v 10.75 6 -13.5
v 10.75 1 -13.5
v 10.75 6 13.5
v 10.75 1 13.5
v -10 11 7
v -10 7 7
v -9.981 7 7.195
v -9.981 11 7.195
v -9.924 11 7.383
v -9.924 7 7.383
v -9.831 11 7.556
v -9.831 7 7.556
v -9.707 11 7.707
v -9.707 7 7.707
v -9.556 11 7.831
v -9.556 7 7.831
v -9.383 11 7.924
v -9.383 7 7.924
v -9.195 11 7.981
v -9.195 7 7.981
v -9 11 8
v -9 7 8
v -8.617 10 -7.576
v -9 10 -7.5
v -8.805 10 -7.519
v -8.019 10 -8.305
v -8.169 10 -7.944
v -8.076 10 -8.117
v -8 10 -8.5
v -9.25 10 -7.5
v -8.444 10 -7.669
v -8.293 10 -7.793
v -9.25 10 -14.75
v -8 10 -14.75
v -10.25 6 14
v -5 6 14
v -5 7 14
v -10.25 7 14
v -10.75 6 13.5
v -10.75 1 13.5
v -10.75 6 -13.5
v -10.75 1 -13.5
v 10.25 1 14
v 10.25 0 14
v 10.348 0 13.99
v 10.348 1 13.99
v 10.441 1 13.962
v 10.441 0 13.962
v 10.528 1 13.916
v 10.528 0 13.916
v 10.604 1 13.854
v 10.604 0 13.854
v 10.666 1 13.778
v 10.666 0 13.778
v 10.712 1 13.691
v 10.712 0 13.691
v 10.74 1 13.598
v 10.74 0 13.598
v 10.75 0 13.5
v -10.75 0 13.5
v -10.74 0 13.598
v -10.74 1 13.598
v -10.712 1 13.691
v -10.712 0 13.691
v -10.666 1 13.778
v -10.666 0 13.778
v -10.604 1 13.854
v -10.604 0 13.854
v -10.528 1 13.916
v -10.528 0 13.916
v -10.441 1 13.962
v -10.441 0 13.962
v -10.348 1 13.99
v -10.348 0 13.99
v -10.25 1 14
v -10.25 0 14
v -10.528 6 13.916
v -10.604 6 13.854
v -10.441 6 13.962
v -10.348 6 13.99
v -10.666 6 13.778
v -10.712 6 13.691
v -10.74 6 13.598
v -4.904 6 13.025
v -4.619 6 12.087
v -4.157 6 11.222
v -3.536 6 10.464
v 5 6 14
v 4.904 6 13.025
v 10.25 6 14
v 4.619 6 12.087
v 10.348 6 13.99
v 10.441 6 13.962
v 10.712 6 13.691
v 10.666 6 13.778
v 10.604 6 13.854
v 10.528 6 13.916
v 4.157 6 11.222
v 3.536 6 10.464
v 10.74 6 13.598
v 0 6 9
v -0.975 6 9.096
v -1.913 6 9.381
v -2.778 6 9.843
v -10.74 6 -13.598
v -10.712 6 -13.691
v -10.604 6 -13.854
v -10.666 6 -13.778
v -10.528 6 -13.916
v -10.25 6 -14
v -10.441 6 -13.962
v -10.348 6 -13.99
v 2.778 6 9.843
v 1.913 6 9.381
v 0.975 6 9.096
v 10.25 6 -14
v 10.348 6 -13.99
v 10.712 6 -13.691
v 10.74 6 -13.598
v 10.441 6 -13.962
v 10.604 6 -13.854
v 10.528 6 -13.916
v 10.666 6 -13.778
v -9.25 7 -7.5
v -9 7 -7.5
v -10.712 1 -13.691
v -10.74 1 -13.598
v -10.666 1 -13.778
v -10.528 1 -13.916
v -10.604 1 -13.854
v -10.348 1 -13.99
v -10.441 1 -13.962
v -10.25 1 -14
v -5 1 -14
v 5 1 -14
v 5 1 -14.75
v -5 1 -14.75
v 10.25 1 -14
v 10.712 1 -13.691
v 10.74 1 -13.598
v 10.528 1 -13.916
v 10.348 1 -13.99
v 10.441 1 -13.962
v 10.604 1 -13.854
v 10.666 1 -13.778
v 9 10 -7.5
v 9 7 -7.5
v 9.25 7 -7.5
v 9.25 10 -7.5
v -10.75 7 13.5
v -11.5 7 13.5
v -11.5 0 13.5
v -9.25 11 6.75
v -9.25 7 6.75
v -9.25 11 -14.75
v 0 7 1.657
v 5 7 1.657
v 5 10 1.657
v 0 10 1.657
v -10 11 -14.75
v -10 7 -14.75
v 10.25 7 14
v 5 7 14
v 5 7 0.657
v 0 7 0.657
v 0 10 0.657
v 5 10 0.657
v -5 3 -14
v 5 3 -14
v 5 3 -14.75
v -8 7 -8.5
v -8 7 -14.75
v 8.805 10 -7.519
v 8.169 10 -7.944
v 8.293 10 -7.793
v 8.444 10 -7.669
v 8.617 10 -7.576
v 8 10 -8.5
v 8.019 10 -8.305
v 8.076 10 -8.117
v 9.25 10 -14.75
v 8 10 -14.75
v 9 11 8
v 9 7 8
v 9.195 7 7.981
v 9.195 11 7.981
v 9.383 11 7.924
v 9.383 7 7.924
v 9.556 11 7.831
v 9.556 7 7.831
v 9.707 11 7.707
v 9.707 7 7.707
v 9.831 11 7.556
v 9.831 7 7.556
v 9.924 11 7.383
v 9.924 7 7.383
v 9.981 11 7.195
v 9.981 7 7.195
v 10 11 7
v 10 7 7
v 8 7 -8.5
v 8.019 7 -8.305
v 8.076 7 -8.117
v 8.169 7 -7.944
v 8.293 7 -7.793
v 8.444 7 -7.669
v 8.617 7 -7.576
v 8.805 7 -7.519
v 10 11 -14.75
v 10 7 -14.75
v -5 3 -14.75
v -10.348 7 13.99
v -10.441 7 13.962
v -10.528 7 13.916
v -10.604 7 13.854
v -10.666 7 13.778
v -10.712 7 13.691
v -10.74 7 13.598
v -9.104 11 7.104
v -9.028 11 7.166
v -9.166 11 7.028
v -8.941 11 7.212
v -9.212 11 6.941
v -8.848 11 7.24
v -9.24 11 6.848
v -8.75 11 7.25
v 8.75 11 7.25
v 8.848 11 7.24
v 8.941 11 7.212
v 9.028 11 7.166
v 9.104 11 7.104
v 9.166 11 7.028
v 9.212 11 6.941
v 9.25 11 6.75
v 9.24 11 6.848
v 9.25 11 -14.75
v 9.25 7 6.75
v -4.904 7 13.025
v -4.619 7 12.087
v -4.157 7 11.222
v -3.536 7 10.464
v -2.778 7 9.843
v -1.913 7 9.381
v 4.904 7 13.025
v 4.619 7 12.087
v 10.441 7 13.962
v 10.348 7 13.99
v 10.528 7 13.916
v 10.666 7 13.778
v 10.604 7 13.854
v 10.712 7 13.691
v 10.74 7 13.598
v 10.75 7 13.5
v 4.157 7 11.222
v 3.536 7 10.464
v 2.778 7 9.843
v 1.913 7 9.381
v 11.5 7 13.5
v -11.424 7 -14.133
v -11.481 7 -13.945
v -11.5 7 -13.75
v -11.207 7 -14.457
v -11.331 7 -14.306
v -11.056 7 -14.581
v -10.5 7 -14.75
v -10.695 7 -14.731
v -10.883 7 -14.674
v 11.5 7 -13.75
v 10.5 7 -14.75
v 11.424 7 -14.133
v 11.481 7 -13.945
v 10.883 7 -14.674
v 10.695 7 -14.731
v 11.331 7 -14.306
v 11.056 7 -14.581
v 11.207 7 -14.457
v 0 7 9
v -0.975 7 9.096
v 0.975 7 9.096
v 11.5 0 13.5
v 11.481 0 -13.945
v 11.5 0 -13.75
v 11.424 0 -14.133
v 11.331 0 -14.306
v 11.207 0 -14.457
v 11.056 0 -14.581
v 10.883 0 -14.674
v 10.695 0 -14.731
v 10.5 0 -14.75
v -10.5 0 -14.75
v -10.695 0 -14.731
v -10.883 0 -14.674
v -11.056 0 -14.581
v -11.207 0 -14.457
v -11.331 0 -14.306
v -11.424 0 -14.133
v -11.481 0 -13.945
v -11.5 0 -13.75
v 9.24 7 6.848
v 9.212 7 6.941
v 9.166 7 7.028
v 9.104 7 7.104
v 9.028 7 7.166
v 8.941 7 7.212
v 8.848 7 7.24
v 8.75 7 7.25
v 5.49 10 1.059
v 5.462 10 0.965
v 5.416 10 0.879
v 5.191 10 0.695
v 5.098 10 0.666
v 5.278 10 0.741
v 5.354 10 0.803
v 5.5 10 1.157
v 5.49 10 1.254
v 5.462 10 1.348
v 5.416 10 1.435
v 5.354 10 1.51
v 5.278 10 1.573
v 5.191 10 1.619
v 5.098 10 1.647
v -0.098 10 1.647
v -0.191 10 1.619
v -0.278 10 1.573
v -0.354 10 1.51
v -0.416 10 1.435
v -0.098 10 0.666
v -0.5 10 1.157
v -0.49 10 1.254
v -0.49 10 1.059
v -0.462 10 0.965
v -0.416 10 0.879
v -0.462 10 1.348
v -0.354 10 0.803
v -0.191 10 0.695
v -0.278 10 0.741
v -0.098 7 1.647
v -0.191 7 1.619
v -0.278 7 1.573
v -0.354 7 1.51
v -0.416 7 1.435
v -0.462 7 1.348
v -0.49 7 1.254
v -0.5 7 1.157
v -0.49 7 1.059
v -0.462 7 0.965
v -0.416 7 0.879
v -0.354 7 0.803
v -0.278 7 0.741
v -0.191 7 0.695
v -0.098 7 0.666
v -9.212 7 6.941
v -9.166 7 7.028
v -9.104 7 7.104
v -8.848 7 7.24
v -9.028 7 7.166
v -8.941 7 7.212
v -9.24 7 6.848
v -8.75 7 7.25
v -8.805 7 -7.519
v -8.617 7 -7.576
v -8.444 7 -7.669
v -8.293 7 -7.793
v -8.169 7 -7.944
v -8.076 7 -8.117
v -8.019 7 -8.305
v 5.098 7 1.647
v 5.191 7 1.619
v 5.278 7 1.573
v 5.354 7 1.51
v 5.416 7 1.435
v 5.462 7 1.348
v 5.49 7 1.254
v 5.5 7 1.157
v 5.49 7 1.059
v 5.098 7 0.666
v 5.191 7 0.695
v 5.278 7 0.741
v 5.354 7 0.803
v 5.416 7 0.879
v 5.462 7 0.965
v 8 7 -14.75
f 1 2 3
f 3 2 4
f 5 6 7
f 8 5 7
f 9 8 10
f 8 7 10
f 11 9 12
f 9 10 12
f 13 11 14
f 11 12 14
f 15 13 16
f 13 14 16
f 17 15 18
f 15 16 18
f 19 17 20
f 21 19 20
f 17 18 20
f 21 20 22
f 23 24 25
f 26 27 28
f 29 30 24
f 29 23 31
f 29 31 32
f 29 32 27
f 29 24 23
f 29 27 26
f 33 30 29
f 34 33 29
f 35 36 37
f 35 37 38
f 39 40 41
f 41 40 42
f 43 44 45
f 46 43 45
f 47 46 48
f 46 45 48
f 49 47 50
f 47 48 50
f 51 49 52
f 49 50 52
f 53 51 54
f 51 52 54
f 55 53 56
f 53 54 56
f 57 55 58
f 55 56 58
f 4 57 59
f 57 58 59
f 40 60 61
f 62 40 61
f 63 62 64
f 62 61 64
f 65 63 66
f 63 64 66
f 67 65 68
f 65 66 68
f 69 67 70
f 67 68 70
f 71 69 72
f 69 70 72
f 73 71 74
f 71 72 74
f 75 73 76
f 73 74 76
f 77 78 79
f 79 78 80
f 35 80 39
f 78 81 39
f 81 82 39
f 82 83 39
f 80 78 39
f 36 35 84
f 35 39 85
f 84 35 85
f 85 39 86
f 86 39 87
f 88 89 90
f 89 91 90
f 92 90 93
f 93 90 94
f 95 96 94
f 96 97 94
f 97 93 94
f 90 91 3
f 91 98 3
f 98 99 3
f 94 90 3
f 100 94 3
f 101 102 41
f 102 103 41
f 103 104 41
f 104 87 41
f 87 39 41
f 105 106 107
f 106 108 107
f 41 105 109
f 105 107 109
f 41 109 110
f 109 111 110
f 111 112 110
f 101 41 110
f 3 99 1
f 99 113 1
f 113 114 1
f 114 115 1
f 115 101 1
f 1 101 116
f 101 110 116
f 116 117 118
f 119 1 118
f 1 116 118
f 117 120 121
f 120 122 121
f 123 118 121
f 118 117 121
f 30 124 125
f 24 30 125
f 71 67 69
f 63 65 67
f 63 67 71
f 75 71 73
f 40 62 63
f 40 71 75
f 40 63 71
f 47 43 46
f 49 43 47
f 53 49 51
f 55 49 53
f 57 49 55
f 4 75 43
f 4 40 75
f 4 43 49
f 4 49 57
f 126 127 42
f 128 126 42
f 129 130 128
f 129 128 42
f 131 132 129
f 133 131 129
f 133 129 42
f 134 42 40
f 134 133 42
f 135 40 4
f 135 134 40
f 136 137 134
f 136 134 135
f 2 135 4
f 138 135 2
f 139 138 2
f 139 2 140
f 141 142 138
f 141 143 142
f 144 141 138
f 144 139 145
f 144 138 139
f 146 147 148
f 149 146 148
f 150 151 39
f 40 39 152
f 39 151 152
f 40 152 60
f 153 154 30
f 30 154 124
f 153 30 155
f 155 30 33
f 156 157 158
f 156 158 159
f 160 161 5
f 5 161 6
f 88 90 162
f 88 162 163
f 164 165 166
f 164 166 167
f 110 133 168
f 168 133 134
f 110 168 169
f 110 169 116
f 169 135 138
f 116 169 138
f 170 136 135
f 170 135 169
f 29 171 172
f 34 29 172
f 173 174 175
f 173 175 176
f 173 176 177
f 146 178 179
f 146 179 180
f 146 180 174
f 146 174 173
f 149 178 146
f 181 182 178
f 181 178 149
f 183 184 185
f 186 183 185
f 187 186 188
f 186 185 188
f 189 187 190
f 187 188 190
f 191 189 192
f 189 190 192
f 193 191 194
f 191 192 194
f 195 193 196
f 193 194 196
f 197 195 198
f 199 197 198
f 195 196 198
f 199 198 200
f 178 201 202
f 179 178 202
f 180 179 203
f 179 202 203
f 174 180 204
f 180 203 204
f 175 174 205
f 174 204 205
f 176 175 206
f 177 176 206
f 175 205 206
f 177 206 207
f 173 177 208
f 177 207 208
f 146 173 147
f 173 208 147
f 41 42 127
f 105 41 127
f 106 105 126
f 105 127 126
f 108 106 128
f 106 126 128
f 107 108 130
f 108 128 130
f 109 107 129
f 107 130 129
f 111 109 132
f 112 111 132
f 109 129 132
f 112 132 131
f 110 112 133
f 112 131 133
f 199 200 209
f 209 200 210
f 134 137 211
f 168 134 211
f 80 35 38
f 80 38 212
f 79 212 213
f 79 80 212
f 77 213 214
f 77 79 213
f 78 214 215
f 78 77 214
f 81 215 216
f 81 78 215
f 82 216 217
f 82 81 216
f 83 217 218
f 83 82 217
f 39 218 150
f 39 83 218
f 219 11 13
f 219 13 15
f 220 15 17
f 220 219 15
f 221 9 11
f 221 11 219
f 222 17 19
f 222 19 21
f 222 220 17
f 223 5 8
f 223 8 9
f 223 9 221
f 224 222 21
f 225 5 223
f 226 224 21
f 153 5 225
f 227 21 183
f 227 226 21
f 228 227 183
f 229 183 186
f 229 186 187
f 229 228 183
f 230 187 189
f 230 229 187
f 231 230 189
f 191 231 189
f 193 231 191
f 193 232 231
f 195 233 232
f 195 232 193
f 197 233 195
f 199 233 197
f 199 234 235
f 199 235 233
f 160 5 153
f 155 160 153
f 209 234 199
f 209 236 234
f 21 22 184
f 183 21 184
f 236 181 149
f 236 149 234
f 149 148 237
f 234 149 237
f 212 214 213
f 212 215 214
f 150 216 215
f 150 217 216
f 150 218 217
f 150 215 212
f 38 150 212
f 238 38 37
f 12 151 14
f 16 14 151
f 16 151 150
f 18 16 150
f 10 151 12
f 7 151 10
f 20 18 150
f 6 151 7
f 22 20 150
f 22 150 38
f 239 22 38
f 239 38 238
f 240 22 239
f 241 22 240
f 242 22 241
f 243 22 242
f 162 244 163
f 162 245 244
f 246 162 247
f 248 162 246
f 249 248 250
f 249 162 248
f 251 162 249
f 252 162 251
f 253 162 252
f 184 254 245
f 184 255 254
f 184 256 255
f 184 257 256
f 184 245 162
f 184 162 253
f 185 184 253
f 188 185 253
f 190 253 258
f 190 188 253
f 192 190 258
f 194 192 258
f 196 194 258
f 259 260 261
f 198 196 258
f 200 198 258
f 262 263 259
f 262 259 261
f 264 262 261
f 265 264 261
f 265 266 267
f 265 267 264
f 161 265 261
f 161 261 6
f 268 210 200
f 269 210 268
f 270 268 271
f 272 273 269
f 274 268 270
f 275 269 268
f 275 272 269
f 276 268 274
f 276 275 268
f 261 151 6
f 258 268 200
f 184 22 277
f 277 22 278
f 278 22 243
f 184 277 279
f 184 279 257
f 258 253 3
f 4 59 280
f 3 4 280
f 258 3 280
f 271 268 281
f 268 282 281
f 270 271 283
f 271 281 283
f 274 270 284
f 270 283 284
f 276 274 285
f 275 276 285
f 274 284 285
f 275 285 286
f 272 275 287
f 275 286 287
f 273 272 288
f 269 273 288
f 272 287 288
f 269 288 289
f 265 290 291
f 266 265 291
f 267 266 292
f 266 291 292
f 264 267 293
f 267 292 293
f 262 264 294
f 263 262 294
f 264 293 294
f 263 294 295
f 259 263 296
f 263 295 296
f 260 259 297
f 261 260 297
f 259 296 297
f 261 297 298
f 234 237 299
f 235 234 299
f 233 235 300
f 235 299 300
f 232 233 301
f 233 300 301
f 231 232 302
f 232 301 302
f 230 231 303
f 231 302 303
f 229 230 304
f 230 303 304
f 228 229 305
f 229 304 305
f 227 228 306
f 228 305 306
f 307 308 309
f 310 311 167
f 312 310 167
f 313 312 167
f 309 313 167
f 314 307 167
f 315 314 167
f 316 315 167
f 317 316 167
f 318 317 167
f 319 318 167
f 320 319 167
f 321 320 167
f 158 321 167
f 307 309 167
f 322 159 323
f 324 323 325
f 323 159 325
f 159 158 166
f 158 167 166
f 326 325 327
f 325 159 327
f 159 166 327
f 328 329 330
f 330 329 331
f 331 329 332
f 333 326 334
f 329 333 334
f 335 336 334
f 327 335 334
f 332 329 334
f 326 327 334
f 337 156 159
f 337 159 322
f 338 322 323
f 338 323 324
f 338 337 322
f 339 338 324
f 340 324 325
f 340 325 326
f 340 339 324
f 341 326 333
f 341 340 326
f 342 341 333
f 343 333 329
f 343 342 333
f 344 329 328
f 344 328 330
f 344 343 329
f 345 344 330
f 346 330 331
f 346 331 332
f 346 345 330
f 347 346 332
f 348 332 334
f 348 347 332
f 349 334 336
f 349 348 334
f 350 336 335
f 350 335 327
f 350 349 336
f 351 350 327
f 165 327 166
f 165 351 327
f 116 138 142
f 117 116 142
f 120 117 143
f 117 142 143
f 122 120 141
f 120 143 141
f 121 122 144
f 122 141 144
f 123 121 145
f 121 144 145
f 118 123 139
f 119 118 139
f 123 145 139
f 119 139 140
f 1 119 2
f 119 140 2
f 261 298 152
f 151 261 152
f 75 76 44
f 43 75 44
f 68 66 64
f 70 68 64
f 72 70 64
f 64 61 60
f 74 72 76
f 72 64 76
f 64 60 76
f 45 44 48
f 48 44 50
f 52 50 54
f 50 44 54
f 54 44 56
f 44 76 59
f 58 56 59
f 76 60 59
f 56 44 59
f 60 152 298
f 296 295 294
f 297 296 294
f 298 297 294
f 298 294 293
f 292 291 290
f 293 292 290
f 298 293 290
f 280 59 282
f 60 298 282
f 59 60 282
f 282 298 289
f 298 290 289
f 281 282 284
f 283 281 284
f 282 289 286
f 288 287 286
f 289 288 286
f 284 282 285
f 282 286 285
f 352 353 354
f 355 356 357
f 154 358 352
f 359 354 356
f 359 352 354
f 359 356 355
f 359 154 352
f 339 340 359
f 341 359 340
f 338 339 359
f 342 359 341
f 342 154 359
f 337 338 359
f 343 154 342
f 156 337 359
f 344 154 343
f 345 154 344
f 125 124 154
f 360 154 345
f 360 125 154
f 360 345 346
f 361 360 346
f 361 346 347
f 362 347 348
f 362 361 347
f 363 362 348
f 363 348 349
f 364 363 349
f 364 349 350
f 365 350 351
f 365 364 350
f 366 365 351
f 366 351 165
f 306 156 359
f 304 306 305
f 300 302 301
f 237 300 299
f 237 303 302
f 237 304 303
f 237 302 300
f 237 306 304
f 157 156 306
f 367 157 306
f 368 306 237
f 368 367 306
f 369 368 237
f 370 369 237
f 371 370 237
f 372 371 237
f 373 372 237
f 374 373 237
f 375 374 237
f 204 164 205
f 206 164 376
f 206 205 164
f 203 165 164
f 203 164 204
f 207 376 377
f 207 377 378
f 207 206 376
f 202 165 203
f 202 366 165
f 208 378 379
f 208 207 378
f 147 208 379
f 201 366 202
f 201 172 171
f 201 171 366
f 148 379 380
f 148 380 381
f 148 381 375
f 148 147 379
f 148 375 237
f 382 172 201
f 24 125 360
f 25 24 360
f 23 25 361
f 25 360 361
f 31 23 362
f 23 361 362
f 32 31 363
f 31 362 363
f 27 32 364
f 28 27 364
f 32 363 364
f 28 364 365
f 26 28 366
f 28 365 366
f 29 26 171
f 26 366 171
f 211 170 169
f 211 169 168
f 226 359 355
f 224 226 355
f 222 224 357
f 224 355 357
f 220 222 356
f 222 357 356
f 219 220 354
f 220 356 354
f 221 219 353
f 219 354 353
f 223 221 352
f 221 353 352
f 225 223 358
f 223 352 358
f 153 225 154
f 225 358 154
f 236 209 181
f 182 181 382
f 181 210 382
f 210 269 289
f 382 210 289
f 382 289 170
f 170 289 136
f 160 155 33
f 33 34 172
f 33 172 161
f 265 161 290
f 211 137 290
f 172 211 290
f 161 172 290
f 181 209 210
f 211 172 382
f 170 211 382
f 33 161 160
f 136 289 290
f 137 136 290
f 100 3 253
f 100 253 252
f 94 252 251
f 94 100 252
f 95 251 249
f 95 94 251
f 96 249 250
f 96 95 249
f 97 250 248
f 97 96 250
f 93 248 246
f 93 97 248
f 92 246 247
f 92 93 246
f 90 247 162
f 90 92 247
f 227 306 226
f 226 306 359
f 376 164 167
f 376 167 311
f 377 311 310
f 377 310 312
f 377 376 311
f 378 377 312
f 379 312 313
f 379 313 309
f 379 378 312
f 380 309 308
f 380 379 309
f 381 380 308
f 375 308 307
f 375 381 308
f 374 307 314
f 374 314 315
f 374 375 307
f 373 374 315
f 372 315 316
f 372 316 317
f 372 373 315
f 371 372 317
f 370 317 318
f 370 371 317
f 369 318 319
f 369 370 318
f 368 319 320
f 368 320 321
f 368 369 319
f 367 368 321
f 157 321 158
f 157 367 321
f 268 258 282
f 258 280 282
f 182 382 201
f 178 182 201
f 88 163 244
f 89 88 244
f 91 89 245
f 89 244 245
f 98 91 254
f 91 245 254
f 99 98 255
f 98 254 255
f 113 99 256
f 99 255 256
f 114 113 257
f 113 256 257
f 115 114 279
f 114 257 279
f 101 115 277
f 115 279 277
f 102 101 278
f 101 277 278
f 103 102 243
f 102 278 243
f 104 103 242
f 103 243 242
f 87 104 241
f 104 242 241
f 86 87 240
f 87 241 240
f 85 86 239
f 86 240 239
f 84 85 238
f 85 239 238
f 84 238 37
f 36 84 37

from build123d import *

# Parameters (mm, degrees)
BOSS_EXTRUDE23_DEPTH = 1
BOSS_EXTRUDE27_DEPTH = 6
BOSS_EXTRUDE28_START = 6
BOSS_EXTRUDE28_DEPTH = 1
CUT_EXTRUDE9_DEPTH   = 1
SKETCH15_W           = 10
SKETCH15_H           = 2
CUT_EXTRUDE11_DEPTH  = 10
BOSS_EXTRUDE30_DEPTH = 4
BOSS_EXTRUDE31_DEPTH = 3


with BuildPart() as part:
    # Sketch10 → Boss-Extrude23 (new body)
    with BuildSketch(Plane(origin=(0, 0, 0), x_dir=(1, 0, 0), z_dir=(0, 1, 0))):
        with BuildLine():
            Line((-11.5, -13.5), (-10.75, -13.5))
            ThreePointArc((-10.75, -13.5), (-10.603553391, -13.853553391), (-10.25, -14))
            Line((-10.25, -14), (10.25, -14))
            ThreePointArc((10.25, -14), (10.603553391, -13.853553391), (10.75, -13.5))
            Line((10.75, -13.5), (11.5, -13.5))
            Line((11.5, -13.5), (11.5, 13.75))
            ThreePointArc((11.5, 13.75), (11.207106781, 14.457106781), (10.5, 14.75))
            Line((10.5, 14.75), (-10.5, 14.75))
            ThreePointArc((-10.5, 14.75), (-11.207106781, 14.457106781), (-11.5, 13.75))
            Line((-11.5, 13.75), (-11.5, -13.5))
        make_face()
    extrude(amount=BOSS_EXTRUDE23_DEPTH)

    # Sketch10<6> → Boss-Extrude27 (add)
    with BuildSketch(Plane(origin=(0, 0, 0), x_dir=(1, 0, 0), z_dir=(0, 1, 0))):
        with BuildLine():
            Line((-11.5, -13.5), (-10.75, -13.5))
            Line((-10.75, -13.5), (-10.75, 13.5))
            ThreePointArc((-10.75, 13.5), (-10.603553391, 13.853553391), (-10.25, 14))
            Line((-10.25, 14), (10.25, 14))
            ThreePointArc((10.25, 14), (10.603553391, 13.853553391), (10.75, 13.5))
            Line((10.75, 13.5), (10.75, -13.5))
            Line((10.75, -13.5), (11.5, -13.5))
            Line((11.5, -13.5), (11.5, 13.75))
            ThreePointArc((11.5, 13.75), (11.207106781, 14.457106781), (10.5, 14.75))
            Line((10.5, 14.75), (4.75, 14.75))
            Line((4.75, 14.75), (-4.75, 14.75))
            Line((-4.75, 14.75), (-10.5, 14.75))
            ThreePointArc((-10.5, 14.75), (-11.207106781, 14.457106781), (-11.5, 13.75))
            Line((-11.5, 13.75), (-11.5, -13.5))
        make_face()
    extrude(amount=BOSS_EXTRUDE27_DEPTH)

    # Sketch10<7> → Boss-Extrude28 (add)
    with BuildSketch(Plane(origin=(0, 0, 0), x_dir=(1, 0, 0), z_dir=(0, 1, 0)).offset(BOSS_EXTRUDE28_START)):
        with BuildLine():
            Line((-11.5, -13.5), (-10.75, -13.5))
            ThreePointArc((-10.75, -13.5), (-10.603553391, -13.853553391), (-10.25, -14))
            Line((-10.25, -14), (10.25, -14))
            ThreePointArc((10.25, -14), (10.603553391, -13.853553391), (10.75, -13.5))
            Line((10.75, -13.5), (11.5, -13.5))
            Line((11.5, -13.5), (11.5, 13.75))
            ThreePointArc((11.5, 13.75), (11.207106781, 14.457106781), (10.5, 14.75))
            Line((10.5, 14.75), (-10.5, 14.75))
            ThreePointArc((-10.5, 14.75), (-11.207106781, 14.457106781), (-11.5, 13.75))
            Line((-11.5, 13.75), (-11.5, -13.5))
        make_face()
    extrude(amount=BOSS_EXTRUDE28_DEPTH)

    # Sketch13 → Cut-Extrude9 (cut)
    with BuildSketch(Plane(origin=(0, 7, 0), x_dir=(1, 0, 0), z_dir=(0, 1, 0))):
        with BuildLine():
            Line((-5, -14), (5, -14))
            ThreePointArc((5, -14), (0, -9), (-5, -14))
        make_face()
    extrude(amount=-CUT_EXTRUDE9_DEPTH, mode=Mode.SUBTRACT)

    # Sketch15 → Cut-Extrude11 (cut)
    with BuildSketch(Plane(origin=(0, 0, -14.75), x_dir=(-1, 0, 0), z_dir=(0, 0, -1))):
        with Locations((0, 2)):
            Rectangle(SKETCH15_W, SKETCH15_H)
    extrude(amount=-CUT_EXTRUDE11_DEPTH, mode=Mode.SUBTRACT)

    # Sketch17 → Boss-Extrude30 (add)
    with BuildSketch(Plane(origin=(0, 7, 0), x_dir=(1, 0, 0), z_dir=(0, 1, 0))):
        with BuildLine():
            Line((-9.25, -6.75), (-9.25, 14.75))
            Line((-9.25, 14.75), (-10, 14.75))
            Line((-10, 14.75), (-10, -7))
            ThreePointArc((-10, -7), (-9.707106781, -7.707106781), (-9, -8))
            Line((-9, -8), (9, -8))
            ThreePointArc((9, -8), (9.707106781, -7.707106781), (10, -7))
            Line((10, -7), (10, 14.75))
            Line((10, 14.75), (9.25, 14.75))
            Line((9.25, 14.75), (9.25, -6.75))
            ThreePointArc((9.25, -6.75), (9.103553391, -7.103553391), (8.75, -7.25))
            Line((8.75, -7.25), (-8.75, -7.25))
            ThreePointArc((-8.75, -7.25), (-9.103553391, -7.103553391), (-9.25, -6.75))
        make_face()
    extrude(amount=BOSS_EXTRUDE30_DEPTH)

    # Sketch18 → Boss-Extrude31 (add)
    with BuildSketch(Plane(origin=(0, 7, 0), x_dir=(1, 0, 0), z_dir=(0, 1, 0))):
        with BuildLine():
            ThreePointArc((8, 8.5), (8.292893219, 7.792893219), (9, 7.5))
            Line((9, 7.5), (9.25, 7.5))
            Line((9.25, 7.5), (9.25, 14.75))
            Line((9.25, 14.75), (8, 14.75))
            Line((8, 14.75), (8, 8.5))
        make_face()
        with BuildLine():
            Line((-8, 8.5), (-8, 14.75))
            Line((-8, 14.75), (-9.25, 14.75))
            Line((-9.25, 14.75), (-9.25, 7.5))
            Line((-9.25, 7.5), (-9, 7.5))
            ThreePointArc((-9, 7.5), (-8.292893219, 7.792893219), (-8, 8.5))
        make_face()
        with BuildLine():
            Line((0, -1.656788855), (5, -1.656788855))
            ThreePointArc((5, -1.656788855), (5.5, -1.156788855), (5, -0.656788855))
            Line((5, -0.656788855), (0, -0.656788855))
            ThreePointArc((0, -0.656788855), (-0.5, -1.156788855), (0, -1.656788855))
        make_face()
    extrude(amount=BOSS_EXTRUDE31_DEPTH)


solid = part.part
